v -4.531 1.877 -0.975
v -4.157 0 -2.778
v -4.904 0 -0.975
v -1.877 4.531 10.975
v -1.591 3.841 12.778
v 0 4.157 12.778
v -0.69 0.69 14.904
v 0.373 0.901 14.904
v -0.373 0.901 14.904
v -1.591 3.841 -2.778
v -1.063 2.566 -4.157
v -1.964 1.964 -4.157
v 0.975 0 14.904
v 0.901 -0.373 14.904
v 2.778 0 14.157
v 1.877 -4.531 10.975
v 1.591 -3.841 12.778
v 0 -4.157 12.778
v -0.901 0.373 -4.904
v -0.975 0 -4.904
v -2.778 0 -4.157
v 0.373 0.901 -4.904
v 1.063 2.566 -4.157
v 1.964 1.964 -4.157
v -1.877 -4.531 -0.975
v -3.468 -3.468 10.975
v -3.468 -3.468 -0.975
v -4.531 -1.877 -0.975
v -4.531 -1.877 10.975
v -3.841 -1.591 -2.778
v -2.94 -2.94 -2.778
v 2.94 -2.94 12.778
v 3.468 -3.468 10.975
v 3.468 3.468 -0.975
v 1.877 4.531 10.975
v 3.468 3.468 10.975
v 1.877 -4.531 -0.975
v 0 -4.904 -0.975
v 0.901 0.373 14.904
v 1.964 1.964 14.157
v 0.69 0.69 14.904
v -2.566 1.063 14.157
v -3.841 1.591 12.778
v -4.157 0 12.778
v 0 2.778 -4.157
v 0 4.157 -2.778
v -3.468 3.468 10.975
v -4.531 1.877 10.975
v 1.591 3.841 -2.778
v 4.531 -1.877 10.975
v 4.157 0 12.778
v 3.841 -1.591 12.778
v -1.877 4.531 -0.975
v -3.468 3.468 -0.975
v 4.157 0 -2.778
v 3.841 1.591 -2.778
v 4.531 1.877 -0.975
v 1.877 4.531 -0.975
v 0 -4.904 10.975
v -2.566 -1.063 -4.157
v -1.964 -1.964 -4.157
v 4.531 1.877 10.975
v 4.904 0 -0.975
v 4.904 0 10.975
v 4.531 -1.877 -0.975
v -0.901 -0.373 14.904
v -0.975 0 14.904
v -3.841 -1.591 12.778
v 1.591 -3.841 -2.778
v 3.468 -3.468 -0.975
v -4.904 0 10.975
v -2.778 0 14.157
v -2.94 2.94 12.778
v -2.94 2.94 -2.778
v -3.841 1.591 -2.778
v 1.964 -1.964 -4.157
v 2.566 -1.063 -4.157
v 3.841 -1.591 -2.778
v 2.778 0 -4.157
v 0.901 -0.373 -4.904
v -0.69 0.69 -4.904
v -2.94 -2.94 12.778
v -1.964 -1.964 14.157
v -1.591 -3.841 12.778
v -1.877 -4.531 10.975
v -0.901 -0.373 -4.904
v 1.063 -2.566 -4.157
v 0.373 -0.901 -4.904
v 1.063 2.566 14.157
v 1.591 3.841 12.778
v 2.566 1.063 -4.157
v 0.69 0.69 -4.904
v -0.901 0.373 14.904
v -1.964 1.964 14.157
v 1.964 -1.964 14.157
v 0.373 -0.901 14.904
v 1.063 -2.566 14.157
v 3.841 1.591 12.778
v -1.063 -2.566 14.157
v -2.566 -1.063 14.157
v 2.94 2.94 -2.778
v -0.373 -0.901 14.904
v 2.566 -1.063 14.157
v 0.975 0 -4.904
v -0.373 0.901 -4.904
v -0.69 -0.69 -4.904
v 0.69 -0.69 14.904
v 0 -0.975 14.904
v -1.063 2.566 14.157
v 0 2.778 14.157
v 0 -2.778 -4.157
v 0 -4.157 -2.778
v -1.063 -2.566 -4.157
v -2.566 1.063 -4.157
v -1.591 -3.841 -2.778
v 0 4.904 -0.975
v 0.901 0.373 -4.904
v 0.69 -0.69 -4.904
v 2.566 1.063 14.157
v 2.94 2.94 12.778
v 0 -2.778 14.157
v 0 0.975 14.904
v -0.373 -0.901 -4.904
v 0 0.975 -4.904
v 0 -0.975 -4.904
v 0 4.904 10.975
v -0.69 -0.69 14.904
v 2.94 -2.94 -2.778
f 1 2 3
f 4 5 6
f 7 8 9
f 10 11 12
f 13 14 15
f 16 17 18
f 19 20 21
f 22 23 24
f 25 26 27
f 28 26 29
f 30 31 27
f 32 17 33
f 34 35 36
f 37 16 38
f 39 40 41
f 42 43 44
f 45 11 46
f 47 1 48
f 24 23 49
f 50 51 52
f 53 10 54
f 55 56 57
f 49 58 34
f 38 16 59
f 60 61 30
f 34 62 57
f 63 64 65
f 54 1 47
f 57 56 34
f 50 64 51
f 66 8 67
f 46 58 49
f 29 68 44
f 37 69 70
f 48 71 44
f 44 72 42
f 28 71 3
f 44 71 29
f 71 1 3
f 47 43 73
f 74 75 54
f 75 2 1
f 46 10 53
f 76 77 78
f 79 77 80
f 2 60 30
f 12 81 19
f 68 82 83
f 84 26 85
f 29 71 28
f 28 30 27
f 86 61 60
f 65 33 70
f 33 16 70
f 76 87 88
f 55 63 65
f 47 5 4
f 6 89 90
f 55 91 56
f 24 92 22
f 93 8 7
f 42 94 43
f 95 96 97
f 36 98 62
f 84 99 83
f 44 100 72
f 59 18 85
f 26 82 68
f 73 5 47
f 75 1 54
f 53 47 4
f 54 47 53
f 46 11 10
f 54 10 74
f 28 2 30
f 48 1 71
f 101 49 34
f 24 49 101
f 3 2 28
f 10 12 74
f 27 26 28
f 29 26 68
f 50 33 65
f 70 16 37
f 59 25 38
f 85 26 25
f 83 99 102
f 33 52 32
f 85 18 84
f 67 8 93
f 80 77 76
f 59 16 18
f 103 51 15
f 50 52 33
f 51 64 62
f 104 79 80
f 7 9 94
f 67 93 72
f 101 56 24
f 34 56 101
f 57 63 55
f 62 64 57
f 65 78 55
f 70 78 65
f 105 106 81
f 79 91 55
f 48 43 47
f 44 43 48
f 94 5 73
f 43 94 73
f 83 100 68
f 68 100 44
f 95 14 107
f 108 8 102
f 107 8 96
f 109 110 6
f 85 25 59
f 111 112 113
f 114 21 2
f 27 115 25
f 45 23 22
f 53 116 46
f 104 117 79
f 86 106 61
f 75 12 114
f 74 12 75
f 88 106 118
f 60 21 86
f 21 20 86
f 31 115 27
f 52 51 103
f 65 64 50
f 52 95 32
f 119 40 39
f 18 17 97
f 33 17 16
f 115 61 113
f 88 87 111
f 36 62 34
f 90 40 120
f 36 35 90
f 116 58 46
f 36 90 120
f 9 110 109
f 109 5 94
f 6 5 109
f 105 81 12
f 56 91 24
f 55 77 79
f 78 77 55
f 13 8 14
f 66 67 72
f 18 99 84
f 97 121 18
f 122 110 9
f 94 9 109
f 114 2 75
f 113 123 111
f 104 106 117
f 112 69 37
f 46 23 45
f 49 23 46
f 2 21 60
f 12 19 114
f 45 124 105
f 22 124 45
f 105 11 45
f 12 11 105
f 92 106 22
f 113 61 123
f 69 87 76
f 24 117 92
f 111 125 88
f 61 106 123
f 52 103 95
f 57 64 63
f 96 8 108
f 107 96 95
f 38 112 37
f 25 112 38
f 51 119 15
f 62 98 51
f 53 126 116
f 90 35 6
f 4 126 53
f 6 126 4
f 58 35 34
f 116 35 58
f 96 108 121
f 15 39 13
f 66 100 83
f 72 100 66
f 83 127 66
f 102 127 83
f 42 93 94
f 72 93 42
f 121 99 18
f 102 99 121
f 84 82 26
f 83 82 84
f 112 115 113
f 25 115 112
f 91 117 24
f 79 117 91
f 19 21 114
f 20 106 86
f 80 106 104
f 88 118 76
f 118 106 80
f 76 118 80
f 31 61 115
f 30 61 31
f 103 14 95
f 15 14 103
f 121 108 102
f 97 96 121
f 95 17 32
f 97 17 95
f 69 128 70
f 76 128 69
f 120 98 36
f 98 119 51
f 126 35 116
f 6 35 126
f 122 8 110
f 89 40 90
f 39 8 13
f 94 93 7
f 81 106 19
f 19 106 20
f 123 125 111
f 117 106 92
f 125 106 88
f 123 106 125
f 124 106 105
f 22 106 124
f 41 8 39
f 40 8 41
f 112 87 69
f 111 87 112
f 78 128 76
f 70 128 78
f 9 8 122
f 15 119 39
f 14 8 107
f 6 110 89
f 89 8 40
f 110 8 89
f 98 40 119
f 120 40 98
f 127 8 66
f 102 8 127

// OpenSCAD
module pipe(l,r) {
    assign(distance=l-2*r) {
        hull() {
            translate([0,0,0])
            sphere(r=r);
            translate([0,0,distance])
            sphere(r=r);
        }
    }
}

//translate([0,0,15]) 
//cube(10,true);

color([0, .8, .5]) {
    union() {
        pipe(l=20, r=5);
//        rotate([90,0,0])
//        pipe(l=20, r=5);
    }
}
